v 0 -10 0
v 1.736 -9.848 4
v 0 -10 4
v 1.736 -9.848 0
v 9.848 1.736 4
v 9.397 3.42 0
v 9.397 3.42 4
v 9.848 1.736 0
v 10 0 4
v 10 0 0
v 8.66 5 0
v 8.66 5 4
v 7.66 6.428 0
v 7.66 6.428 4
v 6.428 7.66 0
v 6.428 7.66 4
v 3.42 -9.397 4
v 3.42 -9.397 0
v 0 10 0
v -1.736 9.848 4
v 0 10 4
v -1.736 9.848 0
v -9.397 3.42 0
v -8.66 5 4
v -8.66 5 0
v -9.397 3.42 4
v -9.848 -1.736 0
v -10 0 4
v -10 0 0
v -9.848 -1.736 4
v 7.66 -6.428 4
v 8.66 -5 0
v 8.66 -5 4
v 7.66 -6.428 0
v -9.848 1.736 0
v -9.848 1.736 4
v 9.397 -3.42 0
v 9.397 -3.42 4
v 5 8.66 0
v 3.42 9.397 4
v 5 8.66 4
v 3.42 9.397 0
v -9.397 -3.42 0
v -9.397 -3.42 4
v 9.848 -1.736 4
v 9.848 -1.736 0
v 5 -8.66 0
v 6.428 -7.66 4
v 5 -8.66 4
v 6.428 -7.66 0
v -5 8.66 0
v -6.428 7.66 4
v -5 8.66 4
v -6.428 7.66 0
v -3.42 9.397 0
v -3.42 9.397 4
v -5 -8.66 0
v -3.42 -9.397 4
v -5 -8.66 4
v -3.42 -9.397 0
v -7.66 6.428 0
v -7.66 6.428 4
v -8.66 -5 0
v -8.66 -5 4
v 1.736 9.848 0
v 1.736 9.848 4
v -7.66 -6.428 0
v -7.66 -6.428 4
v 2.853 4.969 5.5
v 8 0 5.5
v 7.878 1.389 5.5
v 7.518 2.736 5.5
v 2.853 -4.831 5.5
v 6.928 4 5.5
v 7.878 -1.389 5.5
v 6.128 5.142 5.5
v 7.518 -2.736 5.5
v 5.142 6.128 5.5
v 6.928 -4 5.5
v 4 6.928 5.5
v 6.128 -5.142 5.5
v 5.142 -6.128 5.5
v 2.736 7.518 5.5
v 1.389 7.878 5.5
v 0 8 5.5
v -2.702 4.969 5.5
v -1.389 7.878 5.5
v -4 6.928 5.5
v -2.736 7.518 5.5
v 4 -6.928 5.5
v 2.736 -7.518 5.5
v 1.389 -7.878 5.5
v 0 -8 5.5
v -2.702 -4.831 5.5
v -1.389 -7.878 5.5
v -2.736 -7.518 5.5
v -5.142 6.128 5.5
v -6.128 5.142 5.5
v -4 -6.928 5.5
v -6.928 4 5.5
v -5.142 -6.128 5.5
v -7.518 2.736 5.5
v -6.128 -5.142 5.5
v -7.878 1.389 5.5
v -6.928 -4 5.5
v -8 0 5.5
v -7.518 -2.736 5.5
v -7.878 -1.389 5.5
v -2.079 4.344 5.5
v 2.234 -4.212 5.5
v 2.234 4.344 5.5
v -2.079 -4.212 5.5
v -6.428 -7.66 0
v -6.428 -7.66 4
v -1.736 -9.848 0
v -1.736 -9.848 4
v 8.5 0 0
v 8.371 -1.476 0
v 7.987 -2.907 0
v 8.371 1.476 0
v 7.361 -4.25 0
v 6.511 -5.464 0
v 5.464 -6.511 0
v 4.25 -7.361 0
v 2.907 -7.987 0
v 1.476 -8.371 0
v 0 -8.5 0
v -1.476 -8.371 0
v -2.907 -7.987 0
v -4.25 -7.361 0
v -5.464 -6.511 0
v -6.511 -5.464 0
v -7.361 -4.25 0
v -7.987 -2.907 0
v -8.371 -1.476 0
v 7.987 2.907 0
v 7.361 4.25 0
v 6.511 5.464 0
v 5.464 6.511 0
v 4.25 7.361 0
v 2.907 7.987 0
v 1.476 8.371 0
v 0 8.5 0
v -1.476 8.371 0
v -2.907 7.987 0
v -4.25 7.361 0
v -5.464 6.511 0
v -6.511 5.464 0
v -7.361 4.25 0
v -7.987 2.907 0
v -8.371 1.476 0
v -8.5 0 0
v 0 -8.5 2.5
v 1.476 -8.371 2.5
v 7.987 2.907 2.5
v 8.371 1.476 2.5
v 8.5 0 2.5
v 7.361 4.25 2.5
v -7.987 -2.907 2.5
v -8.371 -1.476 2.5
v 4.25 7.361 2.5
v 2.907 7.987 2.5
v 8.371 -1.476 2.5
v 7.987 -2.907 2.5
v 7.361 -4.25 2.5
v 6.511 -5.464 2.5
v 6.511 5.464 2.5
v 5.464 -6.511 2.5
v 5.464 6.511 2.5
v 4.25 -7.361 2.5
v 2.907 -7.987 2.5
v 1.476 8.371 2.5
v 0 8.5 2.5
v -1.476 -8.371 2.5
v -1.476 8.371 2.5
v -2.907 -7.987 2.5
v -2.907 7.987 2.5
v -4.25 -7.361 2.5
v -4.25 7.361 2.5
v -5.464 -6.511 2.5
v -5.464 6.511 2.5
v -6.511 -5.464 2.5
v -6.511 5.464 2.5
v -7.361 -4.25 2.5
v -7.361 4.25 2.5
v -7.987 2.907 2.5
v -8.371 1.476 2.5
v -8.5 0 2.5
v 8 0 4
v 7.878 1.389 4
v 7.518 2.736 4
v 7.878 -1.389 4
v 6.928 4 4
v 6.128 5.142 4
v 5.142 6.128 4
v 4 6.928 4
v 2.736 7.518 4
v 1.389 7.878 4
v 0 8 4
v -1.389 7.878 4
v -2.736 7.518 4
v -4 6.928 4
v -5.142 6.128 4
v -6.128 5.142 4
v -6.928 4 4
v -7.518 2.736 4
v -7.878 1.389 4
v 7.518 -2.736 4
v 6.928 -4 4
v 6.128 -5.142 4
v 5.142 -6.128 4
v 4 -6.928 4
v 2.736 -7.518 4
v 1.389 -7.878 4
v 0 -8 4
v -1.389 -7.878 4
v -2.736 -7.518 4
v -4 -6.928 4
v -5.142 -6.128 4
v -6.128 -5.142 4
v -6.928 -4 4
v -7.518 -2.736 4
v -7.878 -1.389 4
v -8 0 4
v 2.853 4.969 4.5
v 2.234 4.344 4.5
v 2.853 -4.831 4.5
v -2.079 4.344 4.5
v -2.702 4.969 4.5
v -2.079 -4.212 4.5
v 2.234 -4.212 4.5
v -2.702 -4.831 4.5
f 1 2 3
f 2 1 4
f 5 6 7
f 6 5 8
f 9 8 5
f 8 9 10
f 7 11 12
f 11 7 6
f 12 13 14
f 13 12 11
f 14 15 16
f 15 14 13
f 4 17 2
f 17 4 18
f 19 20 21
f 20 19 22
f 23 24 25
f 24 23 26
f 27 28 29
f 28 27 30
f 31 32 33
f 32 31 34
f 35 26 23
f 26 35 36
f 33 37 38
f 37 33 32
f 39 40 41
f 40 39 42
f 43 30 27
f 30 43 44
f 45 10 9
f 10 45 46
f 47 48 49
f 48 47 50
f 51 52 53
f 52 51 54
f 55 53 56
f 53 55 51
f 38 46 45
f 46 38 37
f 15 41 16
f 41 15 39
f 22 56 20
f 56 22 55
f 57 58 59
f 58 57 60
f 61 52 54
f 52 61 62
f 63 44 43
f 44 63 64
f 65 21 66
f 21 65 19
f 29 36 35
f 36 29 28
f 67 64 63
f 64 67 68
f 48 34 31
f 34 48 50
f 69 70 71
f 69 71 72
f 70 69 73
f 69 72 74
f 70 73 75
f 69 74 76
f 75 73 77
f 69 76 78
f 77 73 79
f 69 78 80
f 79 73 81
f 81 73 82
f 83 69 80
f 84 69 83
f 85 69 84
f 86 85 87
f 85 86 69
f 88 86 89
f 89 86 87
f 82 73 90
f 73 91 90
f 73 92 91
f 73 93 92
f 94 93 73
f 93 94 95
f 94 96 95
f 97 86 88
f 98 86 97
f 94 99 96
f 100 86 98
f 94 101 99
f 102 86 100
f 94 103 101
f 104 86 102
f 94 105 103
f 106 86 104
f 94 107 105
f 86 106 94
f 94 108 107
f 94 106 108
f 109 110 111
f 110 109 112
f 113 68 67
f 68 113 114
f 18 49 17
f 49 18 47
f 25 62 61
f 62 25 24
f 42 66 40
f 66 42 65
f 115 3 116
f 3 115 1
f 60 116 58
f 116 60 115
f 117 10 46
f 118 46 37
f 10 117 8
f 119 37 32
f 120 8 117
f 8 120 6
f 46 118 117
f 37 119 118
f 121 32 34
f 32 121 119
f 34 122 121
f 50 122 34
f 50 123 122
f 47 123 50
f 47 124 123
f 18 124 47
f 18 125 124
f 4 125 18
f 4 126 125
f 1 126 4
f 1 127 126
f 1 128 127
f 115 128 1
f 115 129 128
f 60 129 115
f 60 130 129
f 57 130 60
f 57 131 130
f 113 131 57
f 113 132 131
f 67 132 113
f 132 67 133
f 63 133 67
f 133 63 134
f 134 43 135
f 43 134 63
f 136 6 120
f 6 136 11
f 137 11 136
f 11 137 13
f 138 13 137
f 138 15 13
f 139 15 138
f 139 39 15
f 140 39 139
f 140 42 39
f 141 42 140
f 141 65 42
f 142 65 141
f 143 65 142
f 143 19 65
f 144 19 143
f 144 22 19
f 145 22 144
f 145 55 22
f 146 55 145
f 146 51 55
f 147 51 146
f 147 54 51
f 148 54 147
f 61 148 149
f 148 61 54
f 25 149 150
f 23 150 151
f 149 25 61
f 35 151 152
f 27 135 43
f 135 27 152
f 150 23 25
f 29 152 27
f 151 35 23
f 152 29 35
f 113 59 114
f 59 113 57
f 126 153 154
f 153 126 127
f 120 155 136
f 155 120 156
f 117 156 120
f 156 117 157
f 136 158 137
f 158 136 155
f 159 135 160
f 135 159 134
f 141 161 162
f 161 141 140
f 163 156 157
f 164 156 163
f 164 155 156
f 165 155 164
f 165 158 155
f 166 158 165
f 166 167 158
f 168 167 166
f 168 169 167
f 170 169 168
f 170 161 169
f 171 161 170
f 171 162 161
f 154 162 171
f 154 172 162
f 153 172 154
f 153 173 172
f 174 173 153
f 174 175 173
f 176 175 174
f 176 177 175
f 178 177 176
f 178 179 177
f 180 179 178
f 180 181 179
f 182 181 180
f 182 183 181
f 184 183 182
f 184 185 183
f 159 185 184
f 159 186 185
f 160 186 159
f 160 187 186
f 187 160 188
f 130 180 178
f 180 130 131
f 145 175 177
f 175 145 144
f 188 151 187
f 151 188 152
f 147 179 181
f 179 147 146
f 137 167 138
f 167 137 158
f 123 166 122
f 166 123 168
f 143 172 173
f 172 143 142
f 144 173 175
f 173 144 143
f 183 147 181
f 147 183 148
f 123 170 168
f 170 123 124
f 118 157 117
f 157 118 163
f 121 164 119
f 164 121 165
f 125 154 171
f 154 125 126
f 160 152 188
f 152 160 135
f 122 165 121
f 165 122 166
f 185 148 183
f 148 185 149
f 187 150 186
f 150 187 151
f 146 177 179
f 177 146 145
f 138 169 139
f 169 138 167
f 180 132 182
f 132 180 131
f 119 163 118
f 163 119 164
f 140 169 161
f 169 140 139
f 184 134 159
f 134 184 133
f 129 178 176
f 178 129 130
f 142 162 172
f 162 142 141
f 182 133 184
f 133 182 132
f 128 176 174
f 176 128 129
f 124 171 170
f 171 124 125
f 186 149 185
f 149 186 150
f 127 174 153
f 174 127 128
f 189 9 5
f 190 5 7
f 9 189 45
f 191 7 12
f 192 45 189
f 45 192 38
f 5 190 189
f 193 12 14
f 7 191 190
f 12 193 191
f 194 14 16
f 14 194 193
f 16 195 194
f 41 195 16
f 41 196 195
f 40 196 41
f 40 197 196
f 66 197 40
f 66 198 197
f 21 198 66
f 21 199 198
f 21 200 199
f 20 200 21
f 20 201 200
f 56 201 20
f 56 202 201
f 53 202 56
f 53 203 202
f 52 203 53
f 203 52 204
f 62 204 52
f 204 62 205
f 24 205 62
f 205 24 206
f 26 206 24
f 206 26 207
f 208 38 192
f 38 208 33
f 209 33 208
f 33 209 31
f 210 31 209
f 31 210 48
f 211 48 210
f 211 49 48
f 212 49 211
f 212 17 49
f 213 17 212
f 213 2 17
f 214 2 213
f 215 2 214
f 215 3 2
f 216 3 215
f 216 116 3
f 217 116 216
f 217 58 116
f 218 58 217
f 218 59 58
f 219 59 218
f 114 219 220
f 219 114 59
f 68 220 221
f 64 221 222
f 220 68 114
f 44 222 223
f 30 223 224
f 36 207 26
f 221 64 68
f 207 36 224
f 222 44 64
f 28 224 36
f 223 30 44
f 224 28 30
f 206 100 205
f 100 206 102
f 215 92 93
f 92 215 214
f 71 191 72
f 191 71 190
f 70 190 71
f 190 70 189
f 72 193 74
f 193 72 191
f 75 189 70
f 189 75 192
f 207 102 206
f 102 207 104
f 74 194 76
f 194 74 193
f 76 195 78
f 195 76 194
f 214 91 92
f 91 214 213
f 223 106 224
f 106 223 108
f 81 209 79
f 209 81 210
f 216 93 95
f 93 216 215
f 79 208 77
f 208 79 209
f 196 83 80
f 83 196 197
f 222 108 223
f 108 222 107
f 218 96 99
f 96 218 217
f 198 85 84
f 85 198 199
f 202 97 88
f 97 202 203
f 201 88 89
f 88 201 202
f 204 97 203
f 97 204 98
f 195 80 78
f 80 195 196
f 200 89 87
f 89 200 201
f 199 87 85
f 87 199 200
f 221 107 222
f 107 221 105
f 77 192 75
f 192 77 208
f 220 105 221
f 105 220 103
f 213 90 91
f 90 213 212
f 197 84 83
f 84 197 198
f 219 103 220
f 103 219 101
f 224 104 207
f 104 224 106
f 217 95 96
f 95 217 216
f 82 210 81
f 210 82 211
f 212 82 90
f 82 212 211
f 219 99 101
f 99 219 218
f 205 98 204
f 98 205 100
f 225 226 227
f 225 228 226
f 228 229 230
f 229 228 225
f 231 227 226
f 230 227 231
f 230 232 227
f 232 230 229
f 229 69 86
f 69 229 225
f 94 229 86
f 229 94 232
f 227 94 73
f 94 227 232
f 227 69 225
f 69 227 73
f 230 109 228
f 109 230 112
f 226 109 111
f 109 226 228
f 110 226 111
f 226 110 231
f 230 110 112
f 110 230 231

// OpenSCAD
difference() {
	difference() {
		difference() {
			cylinder($fn = 36, h = 5.5000000000, r = 10);
			translate(v = [0, 0, -1]) {
				cylinder($fn = 36, h = 3.5000000000, r = 8.5000000000);
			}
		}
		translate(v = [0, 0, 4]) {
			difference() {
				cylinder($fn = 36, h = 3, r = 10.5000000000);
				cylinder($fn = 36, h = 3, r = 8);
			}
		}
	}
	translate(v = [0, 0, 4.5000000000]) {
		linear_extrude(height = 3) {
			text(font = "mana", halign = "center", size = 8, text = "\uE601", valign = "center");
		}
	}
}
